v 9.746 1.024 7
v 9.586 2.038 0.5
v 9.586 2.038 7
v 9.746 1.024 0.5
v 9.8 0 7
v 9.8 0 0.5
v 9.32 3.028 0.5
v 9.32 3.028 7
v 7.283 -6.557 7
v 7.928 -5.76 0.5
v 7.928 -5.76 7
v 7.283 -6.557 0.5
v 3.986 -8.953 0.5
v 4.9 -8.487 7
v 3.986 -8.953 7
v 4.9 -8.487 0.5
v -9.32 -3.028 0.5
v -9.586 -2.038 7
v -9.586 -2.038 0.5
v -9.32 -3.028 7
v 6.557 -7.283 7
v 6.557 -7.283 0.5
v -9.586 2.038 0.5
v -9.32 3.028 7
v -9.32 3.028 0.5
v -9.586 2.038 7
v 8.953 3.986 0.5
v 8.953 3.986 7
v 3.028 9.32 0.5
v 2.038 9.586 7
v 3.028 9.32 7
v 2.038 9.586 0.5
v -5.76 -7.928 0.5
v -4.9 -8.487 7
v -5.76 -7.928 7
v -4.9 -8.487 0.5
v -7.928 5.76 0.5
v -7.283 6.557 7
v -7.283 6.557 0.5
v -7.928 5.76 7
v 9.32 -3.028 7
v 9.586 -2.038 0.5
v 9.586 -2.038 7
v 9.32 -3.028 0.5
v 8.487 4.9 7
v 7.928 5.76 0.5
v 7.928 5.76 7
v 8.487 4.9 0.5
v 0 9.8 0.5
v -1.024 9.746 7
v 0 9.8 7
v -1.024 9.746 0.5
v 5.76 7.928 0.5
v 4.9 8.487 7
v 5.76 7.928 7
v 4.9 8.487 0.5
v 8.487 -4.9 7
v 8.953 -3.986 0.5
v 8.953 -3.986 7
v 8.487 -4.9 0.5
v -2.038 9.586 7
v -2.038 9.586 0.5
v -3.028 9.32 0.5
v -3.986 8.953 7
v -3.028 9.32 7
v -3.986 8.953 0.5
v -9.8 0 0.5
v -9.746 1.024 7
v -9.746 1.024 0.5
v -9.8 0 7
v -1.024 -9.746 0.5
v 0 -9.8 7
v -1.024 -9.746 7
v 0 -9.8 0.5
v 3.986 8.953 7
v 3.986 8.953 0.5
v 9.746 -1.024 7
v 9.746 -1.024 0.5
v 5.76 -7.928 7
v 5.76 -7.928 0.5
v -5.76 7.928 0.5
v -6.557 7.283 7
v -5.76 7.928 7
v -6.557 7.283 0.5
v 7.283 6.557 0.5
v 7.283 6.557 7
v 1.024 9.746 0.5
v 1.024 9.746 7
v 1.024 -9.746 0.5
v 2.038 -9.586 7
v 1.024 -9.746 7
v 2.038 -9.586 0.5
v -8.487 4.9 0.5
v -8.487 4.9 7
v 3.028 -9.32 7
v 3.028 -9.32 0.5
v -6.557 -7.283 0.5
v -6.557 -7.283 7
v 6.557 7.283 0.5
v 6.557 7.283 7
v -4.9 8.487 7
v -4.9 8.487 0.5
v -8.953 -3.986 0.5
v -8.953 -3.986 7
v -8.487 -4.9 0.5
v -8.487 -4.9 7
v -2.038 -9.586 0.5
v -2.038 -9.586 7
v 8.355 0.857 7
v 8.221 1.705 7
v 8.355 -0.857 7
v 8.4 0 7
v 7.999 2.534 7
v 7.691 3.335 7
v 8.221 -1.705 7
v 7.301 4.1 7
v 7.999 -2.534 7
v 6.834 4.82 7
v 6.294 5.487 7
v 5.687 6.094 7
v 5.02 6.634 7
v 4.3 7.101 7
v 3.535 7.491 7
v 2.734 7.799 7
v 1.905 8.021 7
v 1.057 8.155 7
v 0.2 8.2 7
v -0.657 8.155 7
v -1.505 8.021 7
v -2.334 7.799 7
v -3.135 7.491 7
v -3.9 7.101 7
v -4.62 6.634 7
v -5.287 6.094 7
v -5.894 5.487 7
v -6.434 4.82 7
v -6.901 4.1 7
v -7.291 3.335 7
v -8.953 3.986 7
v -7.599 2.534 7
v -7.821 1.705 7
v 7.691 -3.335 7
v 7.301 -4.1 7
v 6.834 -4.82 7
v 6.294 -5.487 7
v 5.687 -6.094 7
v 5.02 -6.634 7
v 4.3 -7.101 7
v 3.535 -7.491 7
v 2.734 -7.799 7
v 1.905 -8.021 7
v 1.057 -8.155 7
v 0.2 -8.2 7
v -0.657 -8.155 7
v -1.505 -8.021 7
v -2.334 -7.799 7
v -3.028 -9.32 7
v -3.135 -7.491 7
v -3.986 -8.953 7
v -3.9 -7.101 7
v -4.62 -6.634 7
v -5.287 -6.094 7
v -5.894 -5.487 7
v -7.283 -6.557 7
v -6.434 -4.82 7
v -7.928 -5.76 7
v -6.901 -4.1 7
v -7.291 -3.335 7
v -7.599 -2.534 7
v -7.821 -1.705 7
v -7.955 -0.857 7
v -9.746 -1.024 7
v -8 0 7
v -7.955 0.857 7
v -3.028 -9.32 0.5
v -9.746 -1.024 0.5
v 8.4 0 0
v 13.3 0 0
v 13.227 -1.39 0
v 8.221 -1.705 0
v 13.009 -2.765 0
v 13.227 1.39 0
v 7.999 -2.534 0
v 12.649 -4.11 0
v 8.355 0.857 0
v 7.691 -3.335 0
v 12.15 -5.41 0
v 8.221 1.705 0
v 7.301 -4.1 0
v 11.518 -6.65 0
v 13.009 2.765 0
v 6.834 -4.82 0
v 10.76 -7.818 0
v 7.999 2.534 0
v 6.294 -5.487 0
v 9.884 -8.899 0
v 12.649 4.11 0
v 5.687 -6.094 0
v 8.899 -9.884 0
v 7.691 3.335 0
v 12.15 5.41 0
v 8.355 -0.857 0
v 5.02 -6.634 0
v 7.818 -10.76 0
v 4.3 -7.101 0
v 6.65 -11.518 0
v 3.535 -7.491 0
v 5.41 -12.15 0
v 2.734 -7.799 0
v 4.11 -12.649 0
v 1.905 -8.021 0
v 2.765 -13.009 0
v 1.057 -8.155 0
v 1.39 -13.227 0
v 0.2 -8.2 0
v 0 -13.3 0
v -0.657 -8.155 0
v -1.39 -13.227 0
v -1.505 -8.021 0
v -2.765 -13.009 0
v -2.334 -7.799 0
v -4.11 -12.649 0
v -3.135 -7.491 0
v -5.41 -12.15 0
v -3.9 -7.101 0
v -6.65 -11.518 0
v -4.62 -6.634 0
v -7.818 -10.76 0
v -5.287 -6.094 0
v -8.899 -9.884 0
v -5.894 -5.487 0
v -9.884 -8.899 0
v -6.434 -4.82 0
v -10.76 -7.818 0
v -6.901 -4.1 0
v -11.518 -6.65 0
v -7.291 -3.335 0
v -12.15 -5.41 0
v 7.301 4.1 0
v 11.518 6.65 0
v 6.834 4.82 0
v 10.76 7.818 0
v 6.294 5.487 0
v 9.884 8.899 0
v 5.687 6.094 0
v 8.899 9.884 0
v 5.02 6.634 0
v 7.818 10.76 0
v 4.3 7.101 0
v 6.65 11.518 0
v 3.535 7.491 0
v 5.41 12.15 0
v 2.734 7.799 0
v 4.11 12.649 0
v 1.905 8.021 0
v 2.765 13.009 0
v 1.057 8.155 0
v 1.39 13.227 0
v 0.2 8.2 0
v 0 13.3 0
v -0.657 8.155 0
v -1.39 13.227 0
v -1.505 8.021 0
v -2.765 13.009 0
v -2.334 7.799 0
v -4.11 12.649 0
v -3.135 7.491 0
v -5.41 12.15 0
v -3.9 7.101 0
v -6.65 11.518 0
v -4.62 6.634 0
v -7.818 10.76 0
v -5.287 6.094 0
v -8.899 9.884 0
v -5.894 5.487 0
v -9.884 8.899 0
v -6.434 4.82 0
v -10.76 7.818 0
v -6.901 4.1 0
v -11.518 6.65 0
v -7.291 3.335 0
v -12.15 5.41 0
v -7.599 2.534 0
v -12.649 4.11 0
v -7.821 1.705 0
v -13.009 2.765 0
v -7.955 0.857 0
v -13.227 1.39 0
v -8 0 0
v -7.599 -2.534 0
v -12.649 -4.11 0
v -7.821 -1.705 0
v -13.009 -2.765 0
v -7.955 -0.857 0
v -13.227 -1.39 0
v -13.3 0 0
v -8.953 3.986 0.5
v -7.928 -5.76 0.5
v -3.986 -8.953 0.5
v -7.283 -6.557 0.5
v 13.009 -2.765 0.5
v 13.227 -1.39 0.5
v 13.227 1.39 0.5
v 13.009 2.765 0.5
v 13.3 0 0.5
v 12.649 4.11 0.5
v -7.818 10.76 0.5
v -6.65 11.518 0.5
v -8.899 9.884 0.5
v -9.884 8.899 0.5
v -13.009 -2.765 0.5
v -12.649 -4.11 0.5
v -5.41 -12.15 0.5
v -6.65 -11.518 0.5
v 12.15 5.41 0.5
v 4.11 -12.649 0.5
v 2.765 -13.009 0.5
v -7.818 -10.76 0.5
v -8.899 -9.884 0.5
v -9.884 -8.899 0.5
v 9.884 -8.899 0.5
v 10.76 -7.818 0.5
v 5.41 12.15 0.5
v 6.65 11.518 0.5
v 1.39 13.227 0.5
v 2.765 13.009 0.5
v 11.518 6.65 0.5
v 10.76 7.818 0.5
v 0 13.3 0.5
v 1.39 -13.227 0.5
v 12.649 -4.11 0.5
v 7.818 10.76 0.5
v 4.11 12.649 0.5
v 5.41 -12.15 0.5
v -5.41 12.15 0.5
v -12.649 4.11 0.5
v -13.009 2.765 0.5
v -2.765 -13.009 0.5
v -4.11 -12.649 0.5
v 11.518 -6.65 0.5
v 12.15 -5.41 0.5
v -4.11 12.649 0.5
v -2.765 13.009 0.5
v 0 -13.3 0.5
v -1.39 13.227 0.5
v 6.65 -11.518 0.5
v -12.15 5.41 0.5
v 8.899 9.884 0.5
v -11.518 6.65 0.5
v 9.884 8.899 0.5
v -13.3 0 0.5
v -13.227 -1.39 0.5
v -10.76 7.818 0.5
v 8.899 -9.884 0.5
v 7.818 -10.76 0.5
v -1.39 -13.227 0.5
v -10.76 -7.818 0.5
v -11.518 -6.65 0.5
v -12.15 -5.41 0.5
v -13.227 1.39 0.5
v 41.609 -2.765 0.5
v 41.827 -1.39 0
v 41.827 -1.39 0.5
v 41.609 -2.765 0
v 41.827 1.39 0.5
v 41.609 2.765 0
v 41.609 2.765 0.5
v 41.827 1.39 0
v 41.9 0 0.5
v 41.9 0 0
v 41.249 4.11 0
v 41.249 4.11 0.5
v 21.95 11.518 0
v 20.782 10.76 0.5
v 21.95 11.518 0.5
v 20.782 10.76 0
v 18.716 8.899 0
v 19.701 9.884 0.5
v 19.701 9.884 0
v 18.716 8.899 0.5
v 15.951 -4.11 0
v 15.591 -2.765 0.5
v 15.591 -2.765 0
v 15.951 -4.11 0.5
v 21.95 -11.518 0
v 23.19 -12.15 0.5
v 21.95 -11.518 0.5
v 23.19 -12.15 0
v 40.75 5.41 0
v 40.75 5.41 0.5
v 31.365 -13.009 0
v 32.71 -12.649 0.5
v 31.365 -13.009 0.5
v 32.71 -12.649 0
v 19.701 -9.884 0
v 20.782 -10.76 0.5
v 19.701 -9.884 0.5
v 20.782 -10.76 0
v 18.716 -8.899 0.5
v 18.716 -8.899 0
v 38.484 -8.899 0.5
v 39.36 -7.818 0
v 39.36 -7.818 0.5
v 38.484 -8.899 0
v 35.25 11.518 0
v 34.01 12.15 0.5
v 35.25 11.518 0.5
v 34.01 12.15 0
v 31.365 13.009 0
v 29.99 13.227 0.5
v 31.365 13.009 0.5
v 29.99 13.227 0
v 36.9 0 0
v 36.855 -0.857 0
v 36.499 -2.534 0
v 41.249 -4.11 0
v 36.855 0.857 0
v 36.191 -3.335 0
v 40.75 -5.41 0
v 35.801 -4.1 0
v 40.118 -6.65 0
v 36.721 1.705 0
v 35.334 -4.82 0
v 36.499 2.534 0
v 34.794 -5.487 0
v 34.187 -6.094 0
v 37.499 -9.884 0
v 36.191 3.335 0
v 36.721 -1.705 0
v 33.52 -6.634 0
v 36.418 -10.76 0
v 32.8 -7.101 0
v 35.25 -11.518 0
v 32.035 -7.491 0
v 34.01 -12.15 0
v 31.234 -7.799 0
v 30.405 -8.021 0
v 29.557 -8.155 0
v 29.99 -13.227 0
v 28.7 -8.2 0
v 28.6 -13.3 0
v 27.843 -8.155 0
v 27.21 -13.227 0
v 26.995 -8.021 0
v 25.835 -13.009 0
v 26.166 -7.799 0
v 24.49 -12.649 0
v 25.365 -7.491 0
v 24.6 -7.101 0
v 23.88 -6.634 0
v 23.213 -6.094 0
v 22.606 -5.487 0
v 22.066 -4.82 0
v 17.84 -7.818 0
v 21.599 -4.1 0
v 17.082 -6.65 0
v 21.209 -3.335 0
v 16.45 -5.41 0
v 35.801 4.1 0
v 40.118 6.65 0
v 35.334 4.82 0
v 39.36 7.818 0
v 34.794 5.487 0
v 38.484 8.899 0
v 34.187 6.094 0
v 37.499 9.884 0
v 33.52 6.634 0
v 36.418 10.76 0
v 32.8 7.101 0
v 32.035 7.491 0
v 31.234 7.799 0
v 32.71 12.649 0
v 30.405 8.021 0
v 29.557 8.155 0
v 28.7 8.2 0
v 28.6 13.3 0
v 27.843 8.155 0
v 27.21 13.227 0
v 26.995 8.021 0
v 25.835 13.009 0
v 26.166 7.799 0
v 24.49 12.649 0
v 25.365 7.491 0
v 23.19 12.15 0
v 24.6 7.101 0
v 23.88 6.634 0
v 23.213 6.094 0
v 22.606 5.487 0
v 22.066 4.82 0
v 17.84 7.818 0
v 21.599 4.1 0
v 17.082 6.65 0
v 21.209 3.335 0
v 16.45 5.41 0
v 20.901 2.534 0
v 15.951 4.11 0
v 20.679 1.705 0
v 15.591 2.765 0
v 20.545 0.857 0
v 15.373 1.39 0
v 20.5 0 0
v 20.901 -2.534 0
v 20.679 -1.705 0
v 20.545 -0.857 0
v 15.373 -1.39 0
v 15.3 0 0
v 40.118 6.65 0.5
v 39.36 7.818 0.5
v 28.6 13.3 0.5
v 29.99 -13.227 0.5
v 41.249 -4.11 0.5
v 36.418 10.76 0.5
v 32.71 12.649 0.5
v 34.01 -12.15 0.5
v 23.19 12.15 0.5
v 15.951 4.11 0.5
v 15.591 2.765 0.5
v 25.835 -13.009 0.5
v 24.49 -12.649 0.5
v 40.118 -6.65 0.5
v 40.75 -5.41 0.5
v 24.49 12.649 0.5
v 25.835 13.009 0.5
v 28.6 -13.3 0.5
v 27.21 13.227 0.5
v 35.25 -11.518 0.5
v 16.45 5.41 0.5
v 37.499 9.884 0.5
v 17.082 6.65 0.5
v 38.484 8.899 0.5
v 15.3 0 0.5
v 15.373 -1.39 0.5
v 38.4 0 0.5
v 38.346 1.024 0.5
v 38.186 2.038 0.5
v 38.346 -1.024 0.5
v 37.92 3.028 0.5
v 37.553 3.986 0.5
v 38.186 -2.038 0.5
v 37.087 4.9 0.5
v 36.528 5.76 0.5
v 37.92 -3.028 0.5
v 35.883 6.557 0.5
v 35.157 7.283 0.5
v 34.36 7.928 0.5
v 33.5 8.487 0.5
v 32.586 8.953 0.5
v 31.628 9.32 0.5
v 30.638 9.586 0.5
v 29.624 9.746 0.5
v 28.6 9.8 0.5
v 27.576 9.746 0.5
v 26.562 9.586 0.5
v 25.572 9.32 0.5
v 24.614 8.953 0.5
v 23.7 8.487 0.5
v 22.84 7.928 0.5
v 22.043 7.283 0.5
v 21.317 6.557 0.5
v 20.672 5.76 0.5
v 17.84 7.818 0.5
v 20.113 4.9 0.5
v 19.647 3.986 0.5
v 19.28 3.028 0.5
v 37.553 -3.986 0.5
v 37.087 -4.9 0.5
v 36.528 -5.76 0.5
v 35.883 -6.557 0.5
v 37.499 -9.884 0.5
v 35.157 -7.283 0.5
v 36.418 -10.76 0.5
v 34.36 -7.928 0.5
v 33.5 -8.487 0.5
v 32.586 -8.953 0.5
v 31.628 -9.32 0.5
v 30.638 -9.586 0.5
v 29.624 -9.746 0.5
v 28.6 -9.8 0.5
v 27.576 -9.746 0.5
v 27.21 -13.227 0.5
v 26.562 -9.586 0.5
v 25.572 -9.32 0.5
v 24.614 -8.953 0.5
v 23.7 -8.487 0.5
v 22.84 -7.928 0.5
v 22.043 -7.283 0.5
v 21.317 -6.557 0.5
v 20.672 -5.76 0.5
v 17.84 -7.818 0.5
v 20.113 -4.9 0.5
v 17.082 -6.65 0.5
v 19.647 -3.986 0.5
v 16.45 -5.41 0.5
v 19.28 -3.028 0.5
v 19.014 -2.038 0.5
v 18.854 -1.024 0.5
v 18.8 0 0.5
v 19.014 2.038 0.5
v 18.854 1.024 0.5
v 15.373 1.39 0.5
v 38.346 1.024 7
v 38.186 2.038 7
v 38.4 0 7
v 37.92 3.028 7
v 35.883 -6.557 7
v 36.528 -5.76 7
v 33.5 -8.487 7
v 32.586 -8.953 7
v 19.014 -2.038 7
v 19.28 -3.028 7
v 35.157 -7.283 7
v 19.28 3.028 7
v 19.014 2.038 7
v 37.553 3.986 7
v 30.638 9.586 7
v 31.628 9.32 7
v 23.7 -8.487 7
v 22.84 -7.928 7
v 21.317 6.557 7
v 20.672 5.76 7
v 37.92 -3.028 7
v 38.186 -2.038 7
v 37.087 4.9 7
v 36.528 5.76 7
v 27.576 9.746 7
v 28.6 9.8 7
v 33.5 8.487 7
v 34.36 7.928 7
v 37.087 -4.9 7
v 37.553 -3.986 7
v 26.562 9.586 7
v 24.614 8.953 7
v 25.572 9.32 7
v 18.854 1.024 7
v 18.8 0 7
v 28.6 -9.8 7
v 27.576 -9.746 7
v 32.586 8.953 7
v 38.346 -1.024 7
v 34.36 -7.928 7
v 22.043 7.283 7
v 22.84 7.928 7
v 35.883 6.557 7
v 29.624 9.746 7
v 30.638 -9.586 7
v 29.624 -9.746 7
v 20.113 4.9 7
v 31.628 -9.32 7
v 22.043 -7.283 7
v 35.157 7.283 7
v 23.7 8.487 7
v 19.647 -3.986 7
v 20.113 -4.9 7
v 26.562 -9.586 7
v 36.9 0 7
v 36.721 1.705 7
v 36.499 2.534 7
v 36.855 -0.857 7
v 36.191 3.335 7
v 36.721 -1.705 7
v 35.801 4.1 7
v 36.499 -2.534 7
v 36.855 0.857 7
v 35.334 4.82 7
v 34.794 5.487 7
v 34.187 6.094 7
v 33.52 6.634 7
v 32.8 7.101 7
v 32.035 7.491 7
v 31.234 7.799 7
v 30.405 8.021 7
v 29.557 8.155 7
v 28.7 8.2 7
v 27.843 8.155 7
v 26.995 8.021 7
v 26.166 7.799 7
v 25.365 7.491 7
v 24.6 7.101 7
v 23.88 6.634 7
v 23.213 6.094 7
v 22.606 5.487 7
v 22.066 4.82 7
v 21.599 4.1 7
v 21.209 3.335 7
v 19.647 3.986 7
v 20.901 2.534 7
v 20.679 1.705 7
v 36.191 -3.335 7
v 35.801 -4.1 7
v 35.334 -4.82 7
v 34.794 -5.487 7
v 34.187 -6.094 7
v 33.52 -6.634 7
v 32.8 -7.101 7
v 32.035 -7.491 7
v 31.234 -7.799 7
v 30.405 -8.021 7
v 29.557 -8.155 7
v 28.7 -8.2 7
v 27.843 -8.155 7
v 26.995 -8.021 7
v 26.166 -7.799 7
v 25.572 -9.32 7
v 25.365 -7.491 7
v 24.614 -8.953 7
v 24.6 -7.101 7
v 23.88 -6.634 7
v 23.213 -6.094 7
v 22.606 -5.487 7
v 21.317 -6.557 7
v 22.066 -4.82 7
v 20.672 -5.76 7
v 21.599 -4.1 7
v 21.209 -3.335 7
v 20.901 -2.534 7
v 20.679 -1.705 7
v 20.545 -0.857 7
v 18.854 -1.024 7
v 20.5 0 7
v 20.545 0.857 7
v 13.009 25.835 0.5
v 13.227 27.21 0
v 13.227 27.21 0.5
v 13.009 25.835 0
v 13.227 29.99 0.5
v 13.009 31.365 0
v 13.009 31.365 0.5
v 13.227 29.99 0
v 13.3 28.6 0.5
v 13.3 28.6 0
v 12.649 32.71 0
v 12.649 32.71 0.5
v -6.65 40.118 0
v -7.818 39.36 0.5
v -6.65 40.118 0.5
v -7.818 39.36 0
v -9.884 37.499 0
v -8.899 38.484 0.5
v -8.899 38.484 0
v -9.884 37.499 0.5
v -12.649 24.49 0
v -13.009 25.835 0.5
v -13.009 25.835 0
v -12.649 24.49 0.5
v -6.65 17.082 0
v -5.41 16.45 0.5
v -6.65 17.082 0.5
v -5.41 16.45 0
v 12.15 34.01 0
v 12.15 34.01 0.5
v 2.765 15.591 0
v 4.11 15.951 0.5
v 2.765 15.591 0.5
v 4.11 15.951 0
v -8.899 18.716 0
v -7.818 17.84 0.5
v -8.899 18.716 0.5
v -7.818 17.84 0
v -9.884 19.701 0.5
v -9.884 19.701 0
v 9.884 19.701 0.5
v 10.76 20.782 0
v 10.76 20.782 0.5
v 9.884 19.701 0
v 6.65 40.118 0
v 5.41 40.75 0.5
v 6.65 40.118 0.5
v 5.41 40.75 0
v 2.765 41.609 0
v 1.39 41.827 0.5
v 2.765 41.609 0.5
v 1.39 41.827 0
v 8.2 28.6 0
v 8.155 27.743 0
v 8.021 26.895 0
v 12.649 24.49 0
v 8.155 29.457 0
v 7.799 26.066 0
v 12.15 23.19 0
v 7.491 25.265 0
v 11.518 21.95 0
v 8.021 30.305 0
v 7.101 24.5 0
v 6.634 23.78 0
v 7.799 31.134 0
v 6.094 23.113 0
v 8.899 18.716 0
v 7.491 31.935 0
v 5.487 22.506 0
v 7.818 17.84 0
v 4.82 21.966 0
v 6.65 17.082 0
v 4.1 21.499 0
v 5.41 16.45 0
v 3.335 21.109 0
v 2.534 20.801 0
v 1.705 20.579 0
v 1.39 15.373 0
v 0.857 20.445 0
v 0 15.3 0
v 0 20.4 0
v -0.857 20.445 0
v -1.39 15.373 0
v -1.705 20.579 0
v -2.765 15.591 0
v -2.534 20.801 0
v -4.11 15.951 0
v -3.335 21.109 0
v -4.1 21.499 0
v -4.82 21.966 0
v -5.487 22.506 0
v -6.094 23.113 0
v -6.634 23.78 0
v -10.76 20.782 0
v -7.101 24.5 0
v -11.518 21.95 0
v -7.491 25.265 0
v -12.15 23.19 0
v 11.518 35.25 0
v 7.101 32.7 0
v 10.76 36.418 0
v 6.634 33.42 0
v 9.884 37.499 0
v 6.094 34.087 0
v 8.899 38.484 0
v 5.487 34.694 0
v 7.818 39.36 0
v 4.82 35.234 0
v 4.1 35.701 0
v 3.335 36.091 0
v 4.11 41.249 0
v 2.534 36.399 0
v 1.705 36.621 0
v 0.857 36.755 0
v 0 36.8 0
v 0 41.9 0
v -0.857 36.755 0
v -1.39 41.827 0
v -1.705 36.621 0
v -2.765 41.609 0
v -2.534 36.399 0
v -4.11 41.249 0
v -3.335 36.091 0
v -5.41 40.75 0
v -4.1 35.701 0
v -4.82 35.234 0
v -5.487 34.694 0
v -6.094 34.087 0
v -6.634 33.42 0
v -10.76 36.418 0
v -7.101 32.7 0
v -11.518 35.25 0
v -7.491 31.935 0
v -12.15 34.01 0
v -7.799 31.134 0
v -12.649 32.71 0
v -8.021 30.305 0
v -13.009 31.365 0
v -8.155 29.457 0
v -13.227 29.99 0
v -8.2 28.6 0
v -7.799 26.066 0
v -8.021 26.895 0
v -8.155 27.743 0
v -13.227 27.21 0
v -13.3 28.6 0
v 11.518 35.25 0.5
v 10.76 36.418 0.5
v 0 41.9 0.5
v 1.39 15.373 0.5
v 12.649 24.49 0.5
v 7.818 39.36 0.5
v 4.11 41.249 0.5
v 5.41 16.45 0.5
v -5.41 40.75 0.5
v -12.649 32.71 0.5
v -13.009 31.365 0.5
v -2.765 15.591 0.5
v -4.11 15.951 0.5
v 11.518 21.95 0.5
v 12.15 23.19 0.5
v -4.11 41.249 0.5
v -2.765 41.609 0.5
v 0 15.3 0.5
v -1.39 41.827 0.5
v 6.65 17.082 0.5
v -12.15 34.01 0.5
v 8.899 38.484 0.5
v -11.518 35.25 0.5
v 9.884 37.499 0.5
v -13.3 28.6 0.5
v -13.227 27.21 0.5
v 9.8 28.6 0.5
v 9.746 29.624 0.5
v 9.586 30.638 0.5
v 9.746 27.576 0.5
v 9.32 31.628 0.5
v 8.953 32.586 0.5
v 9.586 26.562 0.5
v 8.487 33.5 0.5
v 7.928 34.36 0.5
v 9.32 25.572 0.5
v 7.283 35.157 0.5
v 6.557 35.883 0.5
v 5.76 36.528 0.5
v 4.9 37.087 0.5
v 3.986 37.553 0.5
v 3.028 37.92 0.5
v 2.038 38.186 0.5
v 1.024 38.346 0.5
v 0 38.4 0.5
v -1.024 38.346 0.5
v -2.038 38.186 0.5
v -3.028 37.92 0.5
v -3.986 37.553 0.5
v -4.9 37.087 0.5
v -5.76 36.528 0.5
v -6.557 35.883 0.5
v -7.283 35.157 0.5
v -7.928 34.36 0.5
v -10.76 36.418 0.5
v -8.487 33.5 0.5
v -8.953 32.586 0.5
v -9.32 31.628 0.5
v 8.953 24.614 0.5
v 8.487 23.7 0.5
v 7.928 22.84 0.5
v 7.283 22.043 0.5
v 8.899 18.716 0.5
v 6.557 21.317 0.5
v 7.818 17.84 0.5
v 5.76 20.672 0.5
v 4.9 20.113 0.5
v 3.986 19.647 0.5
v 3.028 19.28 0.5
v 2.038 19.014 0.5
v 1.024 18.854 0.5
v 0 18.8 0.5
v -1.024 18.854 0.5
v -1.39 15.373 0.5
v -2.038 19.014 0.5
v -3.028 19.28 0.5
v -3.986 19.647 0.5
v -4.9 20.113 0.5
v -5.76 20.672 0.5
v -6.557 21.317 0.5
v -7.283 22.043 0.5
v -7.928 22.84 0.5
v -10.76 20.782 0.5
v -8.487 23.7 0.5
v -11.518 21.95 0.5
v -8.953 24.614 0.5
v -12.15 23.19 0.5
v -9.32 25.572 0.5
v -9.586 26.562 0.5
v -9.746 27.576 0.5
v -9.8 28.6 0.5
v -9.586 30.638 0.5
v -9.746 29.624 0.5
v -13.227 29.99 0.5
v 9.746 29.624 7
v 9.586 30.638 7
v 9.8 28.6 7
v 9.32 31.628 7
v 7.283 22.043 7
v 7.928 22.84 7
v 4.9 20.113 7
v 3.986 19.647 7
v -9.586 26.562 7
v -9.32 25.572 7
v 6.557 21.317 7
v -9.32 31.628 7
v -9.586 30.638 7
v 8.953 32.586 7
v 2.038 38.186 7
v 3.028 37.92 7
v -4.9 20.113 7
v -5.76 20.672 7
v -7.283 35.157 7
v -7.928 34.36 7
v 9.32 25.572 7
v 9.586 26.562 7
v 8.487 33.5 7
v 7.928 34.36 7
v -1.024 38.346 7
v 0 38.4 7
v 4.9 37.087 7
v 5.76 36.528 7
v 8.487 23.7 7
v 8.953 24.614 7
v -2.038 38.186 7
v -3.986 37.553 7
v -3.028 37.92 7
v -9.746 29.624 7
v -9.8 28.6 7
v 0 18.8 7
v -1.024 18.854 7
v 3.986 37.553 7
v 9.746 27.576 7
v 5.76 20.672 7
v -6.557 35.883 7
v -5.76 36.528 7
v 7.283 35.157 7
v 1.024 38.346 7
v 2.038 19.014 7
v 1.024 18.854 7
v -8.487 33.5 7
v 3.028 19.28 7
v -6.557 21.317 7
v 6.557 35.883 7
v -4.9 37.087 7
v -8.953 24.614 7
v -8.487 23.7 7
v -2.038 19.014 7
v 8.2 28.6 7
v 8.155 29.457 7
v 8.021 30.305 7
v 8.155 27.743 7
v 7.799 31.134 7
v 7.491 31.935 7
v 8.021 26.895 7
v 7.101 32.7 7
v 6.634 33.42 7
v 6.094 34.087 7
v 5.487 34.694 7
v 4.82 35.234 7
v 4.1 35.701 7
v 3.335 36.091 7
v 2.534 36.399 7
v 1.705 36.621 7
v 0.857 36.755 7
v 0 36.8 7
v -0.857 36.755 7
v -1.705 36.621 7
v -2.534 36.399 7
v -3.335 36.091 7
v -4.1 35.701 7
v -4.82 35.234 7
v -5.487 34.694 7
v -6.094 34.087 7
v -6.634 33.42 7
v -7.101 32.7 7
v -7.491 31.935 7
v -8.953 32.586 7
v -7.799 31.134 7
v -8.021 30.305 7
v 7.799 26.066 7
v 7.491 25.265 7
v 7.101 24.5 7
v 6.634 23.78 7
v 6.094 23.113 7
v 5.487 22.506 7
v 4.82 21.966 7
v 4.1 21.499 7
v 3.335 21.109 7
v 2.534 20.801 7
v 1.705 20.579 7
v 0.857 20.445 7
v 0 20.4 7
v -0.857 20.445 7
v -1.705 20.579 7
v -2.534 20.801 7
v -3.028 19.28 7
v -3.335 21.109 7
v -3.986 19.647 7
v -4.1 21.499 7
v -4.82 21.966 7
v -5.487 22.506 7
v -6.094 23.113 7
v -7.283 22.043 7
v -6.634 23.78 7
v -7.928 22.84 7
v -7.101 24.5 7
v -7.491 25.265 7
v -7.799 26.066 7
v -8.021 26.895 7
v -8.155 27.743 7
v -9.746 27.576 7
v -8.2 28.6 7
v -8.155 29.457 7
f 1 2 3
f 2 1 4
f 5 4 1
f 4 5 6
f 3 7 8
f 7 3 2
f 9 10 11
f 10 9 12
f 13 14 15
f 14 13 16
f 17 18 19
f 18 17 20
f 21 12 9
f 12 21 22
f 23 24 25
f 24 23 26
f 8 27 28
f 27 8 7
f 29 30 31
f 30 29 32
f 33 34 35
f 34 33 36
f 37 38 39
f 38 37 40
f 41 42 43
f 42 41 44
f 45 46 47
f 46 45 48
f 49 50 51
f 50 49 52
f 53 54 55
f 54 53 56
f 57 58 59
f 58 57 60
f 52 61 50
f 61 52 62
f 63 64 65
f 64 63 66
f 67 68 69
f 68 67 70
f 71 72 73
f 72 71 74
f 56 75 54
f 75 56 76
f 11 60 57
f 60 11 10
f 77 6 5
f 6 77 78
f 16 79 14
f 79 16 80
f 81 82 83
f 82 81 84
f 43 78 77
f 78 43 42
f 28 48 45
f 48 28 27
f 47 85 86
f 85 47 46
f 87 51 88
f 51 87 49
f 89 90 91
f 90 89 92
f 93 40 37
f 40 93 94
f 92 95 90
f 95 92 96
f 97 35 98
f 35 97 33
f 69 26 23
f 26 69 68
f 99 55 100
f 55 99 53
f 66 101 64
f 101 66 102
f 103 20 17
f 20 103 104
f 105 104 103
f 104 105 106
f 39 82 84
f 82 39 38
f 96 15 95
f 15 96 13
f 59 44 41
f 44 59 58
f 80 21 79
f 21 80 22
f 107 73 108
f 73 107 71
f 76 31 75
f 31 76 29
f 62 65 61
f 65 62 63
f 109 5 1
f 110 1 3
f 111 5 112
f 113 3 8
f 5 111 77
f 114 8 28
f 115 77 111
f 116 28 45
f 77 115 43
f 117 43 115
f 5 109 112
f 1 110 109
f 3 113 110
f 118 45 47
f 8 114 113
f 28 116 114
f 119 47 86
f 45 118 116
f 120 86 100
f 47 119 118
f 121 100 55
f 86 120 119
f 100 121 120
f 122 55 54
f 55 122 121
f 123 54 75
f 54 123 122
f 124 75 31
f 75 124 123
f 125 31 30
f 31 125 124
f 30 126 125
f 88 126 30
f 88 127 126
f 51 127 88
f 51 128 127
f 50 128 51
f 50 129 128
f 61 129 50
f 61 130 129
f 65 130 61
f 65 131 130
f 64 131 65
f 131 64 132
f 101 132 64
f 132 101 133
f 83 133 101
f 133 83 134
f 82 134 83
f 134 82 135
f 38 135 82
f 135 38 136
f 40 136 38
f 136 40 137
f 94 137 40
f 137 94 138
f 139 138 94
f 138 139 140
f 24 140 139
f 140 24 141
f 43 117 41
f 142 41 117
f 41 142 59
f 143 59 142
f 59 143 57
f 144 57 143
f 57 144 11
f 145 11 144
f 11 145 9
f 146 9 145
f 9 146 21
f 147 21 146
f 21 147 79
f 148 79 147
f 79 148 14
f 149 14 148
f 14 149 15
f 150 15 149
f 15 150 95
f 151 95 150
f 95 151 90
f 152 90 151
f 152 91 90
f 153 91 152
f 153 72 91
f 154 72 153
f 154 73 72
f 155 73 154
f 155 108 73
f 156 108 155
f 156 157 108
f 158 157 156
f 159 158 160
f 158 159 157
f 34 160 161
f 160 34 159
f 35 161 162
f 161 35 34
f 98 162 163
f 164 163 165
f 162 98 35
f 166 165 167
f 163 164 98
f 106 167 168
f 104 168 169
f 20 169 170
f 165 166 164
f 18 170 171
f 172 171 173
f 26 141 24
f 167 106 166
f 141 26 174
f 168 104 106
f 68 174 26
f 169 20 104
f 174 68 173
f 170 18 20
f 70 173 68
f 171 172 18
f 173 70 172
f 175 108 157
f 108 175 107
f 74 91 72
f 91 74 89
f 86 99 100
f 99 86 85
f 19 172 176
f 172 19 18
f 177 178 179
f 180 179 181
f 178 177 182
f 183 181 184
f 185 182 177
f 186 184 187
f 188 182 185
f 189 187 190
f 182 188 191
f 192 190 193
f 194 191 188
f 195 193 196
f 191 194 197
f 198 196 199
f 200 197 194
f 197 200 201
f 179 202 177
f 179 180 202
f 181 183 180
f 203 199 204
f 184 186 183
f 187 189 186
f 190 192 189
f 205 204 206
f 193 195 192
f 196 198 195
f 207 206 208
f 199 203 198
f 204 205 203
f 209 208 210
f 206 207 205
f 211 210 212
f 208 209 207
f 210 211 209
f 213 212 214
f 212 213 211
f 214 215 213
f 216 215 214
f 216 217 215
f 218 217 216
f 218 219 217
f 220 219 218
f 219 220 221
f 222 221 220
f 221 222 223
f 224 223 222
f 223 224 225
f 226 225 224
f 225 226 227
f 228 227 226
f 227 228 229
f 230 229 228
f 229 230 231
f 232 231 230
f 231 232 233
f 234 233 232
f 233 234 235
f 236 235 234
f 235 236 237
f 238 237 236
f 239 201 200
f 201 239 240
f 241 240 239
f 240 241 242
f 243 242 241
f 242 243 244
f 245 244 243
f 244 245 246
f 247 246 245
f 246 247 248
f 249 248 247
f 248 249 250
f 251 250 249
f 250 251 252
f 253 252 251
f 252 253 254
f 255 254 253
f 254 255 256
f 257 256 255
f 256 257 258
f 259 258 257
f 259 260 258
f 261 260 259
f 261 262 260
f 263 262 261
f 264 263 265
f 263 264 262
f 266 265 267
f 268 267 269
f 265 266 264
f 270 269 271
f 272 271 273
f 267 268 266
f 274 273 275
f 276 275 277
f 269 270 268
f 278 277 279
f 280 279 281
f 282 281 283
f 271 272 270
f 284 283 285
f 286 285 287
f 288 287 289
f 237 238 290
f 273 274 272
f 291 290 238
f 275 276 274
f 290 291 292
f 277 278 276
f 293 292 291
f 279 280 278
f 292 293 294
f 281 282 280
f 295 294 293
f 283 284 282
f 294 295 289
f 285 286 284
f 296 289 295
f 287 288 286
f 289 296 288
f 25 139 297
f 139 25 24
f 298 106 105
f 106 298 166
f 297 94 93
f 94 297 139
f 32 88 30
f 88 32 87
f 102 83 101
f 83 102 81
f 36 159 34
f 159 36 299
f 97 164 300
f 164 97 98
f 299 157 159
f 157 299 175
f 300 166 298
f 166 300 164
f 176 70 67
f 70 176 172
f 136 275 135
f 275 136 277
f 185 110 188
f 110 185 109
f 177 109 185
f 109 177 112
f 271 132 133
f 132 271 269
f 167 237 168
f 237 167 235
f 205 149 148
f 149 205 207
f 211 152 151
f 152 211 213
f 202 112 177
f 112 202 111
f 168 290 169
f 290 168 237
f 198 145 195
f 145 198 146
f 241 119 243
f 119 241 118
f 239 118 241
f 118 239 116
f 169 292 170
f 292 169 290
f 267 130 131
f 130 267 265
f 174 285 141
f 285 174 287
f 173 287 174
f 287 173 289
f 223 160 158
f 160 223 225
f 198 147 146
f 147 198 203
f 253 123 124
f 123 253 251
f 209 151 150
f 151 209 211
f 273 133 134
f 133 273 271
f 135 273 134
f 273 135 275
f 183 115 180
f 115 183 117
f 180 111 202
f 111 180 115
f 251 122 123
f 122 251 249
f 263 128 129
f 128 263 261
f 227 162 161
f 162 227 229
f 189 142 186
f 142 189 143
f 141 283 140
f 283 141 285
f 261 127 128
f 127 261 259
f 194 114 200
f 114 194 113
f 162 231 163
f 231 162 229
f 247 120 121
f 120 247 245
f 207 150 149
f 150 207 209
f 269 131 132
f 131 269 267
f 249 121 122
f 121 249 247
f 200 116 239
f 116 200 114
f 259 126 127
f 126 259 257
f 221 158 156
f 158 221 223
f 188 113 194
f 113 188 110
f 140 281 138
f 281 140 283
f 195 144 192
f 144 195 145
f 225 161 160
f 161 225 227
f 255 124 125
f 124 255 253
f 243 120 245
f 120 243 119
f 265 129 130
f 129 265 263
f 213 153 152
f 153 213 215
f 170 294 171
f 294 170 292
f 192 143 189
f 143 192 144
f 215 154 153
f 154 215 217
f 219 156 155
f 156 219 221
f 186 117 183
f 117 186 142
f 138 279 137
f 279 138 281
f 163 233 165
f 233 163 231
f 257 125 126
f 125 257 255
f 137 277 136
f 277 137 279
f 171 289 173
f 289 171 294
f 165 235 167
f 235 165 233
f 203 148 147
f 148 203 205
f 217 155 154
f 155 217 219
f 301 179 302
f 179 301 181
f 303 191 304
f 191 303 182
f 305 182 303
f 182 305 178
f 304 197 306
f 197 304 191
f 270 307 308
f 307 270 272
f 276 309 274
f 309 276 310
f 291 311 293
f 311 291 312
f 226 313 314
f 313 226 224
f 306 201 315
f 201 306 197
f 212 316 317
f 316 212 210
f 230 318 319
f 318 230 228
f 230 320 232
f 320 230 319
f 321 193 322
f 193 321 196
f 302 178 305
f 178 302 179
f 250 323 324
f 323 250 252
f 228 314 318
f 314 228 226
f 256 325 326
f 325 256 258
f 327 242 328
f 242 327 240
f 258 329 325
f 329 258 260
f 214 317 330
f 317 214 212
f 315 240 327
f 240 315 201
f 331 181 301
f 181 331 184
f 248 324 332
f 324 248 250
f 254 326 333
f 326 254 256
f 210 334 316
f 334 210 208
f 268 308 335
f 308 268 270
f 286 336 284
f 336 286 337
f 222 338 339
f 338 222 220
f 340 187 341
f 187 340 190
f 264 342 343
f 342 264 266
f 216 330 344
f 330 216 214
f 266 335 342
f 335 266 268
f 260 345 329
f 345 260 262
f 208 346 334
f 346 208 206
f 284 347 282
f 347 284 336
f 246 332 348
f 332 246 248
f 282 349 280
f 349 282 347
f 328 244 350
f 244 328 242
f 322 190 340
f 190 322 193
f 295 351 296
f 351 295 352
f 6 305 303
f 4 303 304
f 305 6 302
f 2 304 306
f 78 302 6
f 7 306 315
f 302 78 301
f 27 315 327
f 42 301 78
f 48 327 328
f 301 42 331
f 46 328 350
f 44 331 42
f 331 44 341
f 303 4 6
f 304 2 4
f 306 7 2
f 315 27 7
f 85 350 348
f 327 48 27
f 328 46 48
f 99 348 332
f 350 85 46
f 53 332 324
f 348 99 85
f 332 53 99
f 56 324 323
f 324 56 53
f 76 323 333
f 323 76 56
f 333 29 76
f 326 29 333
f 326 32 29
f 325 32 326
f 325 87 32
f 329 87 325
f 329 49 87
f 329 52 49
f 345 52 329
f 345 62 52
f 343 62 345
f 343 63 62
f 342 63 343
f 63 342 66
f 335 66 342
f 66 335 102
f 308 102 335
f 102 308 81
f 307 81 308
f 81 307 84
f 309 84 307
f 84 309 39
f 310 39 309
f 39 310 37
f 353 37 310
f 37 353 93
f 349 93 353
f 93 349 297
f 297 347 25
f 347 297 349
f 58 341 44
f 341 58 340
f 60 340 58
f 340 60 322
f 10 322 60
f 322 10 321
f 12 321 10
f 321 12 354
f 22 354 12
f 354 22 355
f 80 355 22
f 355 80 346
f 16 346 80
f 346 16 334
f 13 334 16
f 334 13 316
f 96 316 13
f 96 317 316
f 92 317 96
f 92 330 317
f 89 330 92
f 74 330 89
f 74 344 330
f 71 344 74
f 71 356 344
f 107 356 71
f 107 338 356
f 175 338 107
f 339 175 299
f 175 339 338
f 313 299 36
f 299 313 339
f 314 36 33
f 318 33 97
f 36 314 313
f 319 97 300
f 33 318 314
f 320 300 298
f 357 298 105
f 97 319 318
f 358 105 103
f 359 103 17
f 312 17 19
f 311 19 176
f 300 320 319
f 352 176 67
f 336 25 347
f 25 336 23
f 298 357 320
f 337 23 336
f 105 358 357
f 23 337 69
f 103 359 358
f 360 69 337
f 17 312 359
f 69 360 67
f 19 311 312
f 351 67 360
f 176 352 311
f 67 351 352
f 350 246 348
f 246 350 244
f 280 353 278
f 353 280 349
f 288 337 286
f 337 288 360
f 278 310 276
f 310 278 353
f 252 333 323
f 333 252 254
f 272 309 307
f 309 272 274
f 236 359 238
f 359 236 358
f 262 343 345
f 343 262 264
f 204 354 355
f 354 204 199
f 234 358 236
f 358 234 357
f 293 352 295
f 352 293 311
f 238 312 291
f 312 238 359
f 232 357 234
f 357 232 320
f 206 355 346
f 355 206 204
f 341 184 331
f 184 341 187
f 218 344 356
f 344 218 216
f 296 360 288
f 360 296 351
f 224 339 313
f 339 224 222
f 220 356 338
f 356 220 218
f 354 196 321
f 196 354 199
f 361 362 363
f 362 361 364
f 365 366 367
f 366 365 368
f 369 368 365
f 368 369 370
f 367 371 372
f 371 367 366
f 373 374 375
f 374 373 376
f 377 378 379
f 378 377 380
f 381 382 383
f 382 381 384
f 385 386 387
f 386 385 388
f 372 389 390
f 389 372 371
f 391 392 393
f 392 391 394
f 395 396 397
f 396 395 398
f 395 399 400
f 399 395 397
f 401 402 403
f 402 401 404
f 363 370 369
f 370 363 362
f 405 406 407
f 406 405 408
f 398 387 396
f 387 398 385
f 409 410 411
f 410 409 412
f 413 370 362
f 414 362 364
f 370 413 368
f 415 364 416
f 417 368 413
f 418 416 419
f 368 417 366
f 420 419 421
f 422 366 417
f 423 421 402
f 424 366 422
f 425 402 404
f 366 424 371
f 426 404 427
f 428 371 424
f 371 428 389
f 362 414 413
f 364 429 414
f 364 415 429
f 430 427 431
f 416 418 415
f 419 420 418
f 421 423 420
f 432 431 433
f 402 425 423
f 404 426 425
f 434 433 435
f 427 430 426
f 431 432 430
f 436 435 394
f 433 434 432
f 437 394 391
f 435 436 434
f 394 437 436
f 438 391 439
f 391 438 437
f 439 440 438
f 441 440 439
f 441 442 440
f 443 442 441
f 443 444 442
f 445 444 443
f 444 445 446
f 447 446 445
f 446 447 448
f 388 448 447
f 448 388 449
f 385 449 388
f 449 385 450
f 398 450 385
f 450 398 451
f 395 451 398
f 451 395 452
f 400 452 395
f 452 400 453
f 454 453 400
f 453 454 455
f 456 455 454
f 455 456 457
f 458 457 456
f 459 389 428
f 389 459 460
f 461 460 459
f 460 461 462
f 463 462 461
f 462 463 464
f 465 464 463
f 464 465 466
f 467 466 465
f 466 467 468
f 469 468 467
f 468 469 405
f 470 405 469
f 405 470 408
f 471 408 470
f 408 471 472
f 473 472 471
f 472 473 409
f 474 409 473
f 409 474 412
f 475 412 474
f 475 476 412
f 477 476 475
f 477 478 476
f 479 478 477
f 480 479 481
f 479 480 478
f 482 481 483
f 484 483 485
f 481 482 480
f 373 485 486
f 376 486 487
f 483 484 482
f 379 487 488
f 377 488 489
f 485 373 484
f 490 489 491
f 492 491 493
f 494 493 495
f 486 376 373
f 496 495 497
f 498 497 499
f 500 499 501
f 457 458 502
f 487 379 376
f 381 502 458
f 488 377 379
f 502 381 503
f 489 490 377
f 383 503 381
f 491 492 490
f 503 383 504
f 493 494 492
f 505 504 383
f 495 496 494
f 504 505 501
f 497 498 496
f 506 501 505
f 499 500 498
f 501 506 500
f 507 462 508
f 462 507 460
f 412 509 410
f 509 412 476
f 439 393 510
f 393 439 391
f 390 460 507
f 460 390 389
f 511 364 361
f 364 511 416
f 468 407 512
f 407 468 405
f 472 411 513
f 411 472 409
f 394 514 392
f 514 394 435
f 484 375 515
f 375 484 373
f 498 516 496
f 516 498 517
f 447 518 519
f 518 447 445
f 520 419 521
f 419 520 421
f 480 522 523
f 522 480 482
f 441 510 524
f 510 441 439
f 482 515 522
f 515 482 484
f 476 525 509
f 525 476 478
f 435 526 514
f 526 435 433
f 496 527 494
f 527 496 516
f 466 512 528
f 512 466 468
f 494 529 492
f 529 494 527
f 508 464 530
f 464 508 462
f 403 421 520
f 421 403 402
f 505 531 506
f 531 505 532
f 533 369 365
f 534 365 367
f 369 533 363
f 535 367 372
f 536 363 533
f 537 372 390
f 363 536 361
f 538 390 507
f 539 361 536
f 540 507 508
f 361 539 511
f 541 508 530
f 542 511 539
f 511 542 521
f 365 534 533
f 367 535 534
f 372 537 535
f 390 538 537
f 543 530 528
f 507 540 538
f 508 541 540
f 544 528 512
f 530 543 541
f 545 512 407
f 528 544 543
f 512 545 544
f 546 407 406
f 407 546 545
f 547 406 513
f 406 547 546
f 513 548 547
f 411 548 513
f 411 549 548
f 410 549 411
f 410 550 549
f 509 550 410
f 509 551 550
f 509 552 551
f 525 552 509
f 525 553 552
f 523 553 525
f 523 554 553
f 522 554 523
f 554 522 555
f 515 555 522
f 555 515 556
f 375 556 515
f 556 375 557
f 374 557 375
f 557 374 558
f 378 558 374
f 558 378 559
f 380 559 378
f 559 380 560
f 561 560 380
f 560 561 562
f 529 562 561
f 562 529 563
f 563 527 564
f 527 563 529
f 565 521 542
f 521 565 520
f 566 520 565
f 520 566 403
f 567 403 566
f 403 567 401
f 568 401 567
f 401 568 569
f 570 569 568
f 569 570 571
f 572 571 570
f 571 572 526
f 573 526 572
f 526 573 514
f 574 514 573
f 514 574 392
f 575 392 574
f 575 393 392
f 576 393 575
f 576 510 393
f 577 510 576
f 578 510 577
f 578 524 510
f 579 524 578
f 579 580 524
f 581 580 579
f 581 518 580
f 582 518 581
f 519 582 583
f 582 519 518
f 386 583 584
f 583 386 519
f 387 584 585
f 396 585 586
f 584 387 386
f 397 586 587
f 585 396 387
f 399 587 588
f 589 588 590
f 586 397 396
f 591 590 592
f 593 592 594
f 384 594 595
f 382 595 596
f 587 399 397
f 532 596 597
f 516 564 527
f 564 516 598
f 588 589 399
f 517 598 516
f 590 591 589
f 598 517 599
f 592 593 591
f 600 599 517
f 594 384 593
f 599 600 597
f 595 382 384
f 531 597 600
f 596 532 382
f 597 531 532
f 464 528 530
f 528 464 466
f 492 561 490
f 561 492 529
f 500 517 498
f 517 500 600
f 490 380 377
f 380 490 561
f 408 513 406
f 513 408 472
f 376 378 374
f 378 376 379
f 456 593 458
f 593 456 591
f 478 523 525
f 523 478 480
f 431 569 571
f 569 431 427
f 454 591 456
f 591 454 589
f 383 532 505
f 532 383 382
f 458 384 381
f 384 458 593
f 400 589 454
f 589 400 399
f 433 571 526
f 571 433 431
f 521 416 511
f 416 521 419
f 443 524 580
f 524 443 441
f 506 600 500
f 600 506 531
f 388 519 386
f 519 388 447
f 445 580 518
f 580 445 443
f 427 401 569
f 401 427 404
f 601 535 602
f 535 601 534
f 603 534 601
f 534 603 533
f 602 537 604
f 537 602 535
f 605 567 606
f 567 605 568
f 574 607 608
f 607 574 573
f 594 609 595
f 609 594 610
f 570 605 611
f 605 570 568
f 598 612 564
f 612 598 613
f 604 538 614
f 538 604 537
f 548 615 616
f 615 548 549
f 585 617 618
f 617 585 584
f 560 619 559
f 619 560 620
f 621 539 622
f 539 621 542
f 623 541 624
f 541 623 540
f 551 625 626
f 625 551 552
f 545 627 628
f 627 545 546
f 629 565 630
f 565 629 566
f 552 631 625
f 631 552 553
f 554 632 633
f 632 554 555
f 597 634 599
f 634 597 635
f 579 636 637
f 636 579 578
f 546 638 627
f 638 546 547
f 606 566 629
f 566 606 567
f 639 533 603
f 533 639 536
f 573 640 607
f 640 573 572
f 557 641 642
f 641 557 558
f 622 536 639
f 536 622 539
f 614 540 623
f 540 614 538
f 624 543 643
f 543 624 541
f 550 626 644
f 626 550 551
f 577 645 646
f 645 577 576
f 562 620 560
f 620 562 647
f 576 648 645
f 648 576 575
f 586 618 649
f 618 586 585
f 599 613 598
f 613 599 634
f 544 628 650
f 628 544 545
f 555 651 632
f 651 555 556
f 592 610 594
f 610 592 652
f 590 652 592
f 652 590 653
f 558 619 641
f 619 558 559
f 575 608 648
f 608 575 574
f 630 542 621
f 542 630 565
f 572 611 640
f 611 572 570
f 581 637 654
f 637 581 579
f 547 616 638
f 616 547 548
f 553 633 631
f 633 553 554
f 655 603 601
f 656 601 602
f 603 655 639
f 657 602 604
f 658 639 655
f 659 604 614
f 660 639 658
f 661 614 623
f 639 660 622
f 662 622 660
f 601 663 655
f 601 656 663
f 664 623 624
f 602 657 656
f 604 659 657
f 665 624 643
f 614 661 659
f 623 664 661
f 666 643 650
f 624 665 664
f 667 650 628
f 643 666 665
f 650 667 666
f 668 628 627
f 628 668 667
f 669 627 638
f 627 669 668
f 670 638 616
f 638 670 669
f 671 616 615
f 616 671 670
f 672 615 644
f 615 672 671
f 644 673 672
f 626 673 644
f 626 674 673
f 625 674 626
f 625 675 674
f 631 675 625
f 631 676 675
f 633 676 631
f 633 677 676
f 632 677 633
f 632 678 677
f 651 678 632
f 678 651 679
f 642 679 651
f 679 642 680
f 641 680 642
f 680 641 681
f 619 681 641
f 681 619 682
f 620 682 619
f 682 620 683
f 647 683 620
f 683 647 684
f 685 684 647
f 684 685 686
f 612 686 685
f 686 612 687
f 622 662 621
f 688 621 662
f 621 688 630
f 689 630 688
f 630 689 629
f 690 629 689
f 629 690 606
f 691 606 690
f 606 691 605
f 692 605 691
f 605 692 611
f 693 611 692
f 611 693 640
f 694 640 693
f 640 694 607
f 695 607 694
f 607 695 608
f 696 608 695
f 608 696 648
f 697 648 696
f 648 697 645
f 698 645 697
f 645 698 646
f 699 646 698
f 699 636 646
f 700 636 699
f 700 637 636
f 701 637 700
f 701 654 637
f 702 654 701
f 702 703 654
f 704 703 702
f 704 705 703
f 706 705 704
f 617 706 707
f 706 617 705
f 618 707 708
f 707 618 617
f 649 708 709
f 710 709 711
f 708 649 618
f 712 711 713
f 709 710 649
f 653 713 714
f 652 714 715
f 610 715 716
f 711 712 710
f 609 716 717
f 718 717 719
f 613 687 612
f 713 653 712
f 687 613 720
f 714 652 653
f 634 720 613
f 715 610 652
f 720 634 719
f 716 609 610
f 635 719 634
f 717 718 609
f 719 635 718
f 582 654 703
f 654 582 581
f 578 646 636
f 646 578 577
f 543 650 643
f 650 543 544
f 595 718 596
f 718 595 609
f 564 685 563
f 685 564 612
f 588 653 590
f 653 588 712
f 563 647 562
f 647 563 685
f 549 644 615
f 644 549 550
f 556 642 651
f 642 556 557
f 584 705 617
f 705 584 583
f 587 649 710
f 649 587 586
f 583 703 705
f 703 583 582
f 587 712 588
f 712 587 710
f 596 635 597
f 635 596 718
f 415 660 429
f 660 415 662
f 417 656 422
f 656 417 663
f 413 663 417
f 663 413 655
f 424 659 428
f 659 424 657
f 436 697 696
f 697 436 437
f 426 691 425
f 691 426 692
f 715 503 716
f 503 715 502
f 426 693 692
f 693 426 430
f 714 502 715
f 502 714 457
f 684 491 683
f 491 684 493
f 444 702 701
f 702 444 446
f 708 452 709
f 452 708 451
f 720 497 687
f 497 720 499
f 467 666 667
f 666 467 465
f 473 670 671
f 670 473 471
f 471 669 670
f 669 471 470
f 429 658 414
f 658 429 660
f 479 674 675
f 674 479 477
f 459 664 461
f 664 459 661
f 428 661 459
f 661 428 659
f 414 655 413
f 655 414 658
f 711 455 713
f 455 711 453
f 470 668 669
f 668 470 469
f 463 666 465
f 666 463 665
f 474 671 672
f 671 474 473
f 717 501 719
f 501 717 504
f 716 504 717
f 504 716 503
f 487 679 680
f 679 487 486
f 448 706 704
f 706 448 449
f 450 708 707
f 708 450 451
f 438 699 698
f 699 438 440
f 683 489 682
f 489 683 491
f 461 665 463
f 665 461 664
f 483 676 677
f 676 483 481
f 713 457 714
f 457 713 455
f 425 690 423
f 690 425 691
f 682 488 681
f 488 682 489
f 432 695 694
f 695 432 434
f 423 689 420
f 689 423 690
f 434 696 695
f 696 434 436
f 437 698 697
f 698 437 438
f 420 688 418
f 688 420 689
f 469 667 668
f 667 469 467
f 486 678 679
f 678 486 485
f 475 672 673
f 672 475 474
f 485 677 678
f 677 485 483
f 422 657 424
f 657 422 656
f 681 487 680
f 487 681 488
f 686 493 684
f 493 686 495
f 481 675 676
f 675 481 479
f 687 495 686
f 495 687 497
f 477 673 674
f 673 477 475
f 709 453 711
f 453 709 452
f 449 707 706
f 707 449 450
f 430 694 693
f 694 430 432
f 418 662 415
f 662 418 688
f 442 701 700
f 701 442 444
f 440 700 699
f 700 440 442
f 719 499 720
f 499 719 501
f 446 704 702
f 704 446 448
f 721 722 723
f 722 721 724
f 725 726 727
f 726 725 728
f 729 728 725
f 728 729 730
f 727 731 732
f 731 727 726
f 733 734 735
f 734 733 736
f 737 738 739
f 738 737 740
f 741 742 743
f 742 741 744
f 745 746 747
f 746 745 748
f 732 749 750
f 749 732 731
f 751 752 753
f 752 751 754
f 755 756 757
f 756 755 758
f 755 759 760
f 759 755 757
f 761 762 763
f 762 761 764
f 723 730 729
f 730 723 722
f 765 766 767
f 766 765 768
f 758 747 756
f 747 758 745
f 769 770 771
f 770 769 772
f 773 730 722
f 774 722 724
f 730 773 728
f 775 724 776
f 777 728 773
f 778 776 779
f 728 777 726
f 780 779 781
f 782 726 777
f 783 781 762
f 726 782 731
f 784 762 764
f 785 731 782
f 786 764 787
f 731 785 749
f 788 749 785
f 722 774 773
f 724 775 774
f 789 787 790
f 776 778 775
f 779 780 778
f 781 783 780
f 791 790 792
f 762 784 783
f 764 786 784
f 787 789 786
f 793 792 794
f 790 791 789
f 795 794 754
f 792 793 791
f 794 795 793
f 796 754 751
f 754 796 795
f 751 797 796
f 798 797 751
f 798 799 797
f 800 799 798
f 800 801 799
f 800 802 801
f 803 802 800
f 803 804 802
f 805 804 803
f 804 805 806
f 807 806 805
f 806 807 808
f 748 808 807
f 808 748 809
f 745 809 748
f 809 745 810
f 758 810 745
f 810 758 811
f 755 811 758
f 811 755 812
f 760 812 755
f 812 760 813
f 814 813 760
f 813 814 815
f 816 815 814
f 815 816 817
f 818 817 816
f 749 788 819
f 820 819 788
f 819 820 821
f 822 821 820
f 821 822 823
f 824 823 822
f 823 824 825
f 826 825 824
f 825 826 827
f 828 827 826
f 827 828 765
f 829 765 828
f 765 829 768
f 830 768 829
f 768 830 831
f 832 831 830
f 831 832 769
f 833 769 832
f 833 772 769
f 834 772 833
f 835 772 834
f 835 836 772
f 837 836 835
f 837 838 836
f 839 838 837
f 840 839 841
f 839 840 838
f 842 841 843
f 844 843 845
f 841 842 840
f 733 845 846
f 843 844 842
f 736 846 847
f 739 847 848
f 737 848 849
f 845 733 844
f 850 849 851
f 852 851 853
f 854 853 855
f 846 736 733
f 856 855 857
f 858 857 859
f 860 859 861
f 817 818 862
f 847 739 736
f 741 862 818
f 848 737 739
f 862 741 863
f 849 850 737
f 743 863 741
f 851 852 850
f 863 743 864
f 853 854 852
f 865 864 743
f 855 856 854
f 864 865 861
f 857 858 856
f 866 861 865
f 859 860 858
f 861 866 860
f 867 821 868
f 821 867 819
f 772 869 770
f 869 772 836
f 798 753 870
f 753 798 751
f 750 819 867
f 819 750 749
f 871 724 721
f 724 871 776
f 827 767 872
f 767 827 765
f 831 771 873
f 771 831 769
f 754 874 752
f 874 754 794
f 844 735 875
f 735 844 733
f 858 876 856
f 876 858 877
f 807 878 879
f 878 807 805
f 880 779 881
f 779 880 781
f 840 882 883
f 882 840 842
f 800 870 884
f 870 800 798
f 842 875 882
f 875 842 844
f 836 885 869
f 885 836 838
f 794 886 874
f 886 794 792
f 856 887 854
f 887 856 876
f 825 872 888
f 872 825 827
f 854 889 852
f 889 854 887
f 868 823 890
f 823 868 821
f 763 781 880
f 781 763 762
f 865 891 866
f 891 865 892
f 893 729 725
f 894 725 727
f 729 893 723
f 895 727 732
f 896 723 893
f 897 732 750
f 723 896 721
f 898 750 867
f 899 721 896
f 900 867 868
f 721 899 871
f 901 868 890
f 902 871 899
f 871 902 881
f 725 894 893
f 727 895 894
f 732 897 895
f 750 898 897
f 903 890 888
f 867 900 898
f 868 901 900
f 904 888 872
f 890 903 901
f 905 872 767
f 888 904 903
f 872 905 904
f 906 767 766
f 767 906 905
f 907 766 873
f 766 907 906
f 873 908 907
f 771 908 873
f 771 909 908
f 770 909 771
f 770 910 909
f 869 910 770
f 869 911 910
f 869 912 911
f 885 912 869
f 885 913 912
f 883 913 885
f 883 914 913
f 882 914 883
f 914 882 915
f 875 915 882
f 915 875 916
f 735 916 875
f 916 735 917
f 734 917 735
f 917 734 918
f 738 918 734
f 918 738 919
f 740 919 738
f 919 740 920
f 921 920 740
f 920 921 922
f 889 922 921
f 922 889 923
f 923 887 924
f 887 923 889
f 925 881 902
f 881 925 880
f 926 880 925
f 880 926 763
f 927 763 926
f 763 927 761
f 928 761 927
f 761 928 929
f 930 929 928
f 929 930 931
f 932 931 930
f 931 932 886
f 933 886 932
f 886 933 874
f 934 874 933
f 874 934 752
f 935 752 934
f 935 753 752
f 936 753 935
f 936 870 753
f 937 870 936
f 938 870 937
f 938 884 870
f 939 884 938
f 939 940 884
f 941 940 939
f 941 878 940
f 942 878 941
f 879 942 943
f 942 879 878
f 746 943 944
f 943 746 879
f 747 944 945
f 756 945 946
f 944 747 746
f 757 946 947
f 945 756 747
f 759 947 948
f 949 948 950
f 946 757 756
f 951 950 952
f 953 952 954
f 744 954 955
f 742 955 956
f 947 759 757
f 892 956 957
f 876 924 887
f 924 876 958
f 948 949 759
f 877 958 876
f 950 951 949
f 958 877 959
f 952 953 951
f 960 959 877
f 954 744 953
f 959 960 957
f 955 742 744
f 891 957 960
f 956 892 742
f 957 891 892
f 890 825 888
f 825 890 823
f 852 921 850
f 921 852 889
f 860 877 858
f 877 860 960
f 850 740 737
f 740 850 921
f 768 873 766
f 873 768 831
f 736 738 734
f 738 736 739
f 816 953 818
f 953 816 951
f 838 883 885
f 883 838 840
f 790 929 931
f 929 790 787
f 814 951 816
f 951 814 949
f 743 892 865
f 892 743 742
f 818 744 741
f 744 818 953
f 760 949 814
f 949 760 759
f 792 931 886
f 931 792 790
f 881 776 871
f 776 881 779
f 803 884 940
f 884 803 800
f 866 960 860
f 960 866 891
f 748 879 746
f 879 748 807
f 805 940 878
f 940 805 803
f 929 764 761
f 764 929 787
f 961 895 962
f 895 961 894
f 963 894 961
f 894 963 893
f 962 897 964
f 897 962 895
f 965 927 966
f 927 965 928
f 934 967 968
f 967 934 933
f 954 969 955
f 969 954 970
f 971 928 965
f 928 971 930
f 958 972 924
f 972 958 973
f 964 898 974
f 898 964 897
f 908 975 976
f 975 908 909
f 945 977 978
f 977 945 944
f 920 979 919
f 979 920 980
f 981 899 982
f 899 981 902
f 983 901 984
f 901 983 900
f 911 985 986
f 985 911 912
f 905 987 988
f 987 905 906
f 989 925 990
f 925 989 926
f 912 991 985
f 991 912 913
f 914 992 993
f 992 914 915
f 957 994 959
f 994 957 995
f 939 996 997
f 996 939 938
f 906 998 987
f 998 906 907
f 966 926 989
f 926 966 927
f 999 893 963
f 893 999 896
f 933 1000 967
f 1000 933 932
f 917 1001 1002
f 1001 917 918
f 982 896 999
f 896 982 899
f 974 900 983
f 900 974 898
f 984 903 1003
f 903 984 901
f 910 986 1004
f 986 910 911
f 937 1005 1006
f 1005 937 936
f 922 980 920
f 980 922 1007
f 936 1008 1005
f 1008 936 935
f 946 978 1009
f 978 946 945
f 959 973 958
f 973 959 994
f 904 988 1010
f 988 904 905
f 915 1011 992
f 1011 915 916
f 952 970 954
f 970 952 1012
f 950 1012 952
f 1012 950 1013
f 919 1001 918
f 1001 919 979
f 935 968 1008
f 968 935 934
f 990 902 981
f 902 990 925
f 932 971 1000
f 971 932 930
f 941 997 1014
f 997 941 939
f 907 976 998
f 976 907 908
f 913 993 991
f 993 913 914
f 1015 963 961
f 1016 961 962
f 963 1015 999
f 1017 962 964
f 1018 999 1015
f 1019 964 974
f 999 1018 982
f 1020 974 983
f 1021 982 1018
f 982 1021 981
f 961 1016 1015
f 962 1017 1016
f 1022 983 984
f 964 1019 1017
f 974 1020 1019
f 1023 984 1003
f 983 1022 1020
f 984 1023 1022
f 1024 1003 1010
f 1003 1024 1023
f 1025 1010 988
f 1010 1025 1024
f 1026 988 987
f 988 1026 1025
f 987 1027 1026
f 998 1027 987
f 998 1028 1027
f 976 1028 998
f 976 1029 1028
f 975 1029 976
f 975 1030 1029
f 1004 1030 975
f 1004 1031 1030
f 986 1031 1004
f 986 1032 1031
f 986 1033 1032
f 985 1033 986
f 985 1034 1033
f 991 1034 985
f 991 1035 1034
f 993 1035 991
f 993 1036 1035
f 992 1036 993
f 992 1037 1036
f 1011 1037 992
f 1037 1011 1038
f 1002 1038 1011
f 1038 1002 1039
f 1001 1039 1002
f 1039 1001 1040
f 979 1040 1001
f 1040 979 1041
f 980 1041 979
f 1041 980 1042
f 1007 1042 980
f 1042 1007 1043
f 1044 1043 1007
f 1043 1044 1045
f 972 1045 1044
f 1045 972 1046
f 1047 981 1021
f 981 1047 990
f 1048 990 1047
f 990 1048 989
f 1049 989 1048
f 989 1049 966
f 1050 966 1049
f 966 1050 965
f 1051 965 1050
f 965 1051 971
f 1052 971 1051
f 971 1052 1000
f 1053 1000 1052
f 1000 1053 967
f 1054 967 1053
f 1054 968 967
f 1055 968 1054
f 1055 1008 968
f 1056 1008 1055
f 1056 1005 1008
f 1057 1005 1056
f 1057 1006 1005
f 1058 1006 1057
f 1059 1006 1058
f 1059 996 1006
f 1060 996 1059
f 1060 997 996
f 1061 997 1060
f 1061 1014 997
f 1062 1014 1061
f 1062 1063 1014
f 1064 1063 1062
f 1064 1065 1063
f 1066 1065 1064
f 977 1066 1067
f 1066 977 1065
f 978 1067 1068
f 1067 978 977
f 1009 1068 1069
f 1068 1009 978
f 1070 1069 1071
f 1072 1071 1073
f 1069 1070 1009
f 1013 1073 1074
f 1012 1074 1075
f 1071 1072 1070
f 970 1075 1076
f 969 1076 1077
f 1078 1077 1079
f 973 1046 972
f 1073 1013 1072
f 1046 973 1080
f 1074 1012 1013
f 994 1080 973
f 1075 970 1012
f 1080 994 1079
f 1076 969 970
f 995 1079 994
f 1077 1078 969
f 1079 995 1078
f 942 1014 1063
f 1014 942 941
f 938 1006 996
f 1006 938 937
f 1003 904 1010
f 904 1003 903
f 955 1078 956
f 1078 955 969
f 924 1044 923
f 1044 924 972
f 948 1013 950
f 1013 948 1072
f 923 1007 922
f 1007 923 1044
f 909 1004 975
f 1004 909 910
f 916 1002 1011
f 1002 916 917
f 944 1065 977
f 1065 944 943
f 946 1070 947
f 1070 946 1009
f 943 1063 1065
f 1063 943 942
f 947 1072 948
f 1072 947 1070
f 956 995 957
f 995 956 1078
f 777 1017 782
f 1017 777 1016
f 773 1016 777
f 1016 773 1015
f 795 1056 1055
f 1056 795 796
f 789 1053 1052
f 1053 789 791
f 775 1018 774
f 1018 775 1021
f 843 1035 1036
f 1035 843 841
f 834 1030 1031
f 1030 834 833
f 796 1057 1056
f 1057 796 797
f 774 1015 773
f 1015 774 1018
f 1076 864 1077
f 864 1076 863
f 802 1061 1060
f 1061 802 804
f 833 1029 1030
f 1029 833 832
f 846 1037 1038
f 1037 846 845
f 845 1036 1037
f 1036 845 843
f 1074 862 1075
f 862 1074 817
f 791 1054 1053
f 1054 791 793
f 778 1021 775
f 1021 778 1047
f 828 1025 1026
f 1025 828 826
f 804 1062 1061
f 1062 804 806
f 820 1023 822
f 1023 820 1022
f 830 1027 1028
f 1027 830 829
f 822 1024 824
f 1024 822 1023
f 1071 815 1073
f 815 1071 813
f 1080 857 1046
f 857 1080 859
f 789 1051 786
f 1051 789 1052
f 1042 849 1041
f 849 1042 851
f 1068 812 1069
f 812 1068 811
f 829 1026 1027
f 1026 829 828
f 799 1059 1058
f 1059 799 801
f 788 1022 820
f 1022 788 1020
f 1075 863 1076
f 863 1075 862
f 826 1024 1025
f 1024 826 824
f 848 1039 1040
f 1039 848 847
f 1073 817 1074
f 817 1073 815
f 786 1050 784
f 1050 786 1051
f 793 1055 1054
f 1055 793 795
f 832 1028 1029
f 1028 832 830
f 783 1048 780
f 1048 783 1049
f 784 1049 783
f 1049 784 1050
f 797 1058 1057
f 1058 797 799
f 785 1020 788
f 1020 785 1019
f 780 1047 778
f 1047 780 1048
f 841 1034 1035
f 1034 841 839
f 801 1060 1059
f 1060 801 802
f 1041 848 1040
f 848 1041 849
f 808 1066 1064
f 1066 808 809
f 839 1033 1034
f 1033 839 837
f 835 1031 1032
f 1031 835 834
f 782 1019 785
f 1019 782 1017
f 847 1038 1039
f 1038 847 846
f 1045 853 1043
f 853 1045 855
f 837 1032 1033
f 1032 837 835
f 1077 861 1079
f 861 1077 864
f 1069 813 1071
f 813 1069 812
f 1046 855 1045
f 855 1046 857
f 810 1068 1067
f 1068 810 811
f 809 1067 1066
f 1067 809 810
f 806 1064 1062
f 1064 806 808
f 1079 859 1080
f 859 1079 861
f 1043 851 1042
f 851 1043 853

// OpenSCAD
// Deurklink Monique OM16

d1=16+0.4;
d2=20-0.4;
d3=27-0.4;

layer_1=0.2;
layer_n=0.15;
first_3=layer_1+2*layer_n;

$fn=60;

module vul_ring(disp=0, h=7) {
    difference() {
      cylinder(h=h,d=d2);
      translate([disp,0,-0.1])
      cylinder(h=h+0.2,d=d1);
    }
    difference() {
      cylinder(h=first_3,d=d3);
      translate([0,0,-0.1])
      cylinder(h=10+0.2,d=d2-0.1);
    }
}

vul_ring(disp=0.2);
translate([d3+2,0,0]) vul_ring(disp=0.1);
translate([0,d3+2,0])vul_ring();
